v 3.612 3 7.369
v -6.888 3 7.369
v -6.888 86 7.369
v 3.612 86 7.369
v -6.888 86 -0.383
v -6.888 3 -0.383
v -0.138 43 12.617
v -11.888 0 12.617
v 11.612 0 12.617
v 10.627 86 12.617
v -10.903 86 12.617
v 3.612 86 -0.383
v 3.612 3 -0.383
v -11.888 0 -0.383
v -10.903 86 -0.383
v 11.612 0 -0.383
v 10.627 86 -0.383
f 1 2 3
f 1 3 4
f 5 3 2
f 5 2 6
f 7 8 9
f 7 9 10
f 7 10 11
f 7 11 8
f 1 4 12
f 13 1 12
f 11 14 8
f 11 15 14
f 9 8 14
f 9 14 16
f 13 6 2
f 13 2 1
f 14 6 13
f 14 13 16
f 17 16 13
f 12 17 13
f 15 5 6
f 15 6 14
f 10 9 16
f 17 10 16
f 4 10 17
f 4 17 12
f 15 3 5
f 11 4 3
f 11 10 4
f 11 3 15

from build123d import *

# Parameters (mm, degrees)
SKETCH3_W          = 10.5
SKETCH3_H          = 7.752761779
CUT_EXTRUDE1_DEPTH = 83


with BuildPart() as part:
    # Sketch1 → Loft1 section 0
    with BuildSketch(Plane(origin=(0, 0, 0), x_dir=(1, 0, 0), z_dir=(0, 1, 0))):
        with BuildLine():
            Line((-11.888349515, -12.616504854), (11.611650485, -12.616504854))
            Line((11.611650485, -12.616504854), (11.611650485, 0.383495146))
            Line((11.611650485, 0.383495146), (-11.888349515, 0.383495146))
            Line((-11.888349515, 0.383495146), (-11.888349515, -12.616504854))
        make_face()
    # Sketch2 → Loft1 section 1
    with BuildSketch(Plane(origin=(0, 86, 0), x_dir=(1, 0, 0), z_dir=(0, 1, 0))):
        with BuildLine():
            Line((-10.903349515, -12.616504854), (-10.903349515, 0.383495146))
            Line((-10.903349515, 0.383495146), (10.626650485, 0.383495146))
            Line((10.626650485, 0.383495146), (10.626650485, -12.616504854))
            Line((10.626650485, -12.616504854), (-10.903349515, -12.616504854))
        make_face()
    loft()

    # Sketch3 → Cut-Extrude1 (cut)
    with BuildSketch(Plane(origin=(0, 86, 0), x_dir=(1, 0, 0), z_dir=(0, 1, 0))):
        with Locations((-1.638349515, -3.492885744)):
            Rectangle(SKETCH3_W, SKETCH3_H)
    extrude(amount=-CUT_EXTRUDE1_DEPTH, mode=Mode.SUBTRACT)


solid = part.part
